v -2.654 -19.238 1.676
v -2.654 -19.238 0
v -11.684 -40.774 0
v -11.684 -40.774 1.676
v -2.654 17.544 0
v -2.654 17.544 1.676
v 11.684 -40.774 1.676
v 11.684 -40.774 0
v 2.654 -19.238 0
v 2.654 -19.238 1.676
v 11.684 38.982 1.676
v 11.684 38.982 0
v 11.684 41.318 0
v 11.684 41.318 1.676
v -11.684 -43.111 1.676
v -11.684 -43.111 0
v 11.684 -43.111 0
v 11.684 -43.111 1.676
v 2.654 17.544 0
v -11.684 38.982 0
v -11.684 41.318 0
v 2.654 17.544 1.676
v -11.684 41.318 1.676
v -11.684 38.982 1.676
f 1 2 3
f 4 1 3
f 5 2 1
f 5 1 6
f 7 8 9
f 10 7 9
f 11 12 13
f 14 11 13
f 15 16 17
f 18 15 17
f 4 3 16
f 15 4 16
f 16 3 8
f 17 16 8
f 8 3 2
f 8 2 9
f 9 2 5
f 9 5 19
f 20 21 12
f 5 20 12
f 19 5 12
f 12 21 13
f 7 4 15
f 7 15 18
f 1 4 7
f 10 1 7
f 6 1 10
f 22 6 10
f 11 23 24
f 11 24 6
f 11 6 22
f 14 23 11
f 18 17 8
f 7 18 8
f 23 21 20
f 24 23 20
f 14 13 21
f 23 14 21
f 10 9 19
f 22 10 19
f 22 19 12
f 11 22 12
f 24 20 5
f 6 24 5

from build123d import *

# Parameters (mm, degrees)
F0_W     = 2.6543
F0_H     = 36.782036
F1_DEPTH = 1.6764


with BuildPart() as f1:
    # F0 (on Top) → F1 (new body)
    with BuildSketch(Plane.XY):
        Polygon((0, 41.318396), (0, 17.543996), (2.6543, 17.543996), (11.684, 38.981596), (11.684, 41.318396), align=None)
        Polygon((-2.6543, 17.543996), (0, 17.543996), (0, 41.318396), (-11.684, 41.318396), (-11.684, 38.981596), align=None)
        with Locations((1.32715, -0.847022)):
            Rectangle(F0_W, F0_H)
        with Locations((-1.32715, -0.847022)):
            Rectangle(F0_W, F0_H)
        Polygon((0, -19.336804), (0, -19.23804), (-2.6543, -19.23804), (-11.684, -40.774404), (-11.684, -43.111204), (0, -43.111204), align=None)
        Polygon((2.6543, -19.23804), (0, -19.23804), (0, -19.336804), (0, -43.111204), (11.684, -43.111204), (11.684, -40.774404), align=None)
    extrude(amount=F1_DEPTH)


solid = f1.part
